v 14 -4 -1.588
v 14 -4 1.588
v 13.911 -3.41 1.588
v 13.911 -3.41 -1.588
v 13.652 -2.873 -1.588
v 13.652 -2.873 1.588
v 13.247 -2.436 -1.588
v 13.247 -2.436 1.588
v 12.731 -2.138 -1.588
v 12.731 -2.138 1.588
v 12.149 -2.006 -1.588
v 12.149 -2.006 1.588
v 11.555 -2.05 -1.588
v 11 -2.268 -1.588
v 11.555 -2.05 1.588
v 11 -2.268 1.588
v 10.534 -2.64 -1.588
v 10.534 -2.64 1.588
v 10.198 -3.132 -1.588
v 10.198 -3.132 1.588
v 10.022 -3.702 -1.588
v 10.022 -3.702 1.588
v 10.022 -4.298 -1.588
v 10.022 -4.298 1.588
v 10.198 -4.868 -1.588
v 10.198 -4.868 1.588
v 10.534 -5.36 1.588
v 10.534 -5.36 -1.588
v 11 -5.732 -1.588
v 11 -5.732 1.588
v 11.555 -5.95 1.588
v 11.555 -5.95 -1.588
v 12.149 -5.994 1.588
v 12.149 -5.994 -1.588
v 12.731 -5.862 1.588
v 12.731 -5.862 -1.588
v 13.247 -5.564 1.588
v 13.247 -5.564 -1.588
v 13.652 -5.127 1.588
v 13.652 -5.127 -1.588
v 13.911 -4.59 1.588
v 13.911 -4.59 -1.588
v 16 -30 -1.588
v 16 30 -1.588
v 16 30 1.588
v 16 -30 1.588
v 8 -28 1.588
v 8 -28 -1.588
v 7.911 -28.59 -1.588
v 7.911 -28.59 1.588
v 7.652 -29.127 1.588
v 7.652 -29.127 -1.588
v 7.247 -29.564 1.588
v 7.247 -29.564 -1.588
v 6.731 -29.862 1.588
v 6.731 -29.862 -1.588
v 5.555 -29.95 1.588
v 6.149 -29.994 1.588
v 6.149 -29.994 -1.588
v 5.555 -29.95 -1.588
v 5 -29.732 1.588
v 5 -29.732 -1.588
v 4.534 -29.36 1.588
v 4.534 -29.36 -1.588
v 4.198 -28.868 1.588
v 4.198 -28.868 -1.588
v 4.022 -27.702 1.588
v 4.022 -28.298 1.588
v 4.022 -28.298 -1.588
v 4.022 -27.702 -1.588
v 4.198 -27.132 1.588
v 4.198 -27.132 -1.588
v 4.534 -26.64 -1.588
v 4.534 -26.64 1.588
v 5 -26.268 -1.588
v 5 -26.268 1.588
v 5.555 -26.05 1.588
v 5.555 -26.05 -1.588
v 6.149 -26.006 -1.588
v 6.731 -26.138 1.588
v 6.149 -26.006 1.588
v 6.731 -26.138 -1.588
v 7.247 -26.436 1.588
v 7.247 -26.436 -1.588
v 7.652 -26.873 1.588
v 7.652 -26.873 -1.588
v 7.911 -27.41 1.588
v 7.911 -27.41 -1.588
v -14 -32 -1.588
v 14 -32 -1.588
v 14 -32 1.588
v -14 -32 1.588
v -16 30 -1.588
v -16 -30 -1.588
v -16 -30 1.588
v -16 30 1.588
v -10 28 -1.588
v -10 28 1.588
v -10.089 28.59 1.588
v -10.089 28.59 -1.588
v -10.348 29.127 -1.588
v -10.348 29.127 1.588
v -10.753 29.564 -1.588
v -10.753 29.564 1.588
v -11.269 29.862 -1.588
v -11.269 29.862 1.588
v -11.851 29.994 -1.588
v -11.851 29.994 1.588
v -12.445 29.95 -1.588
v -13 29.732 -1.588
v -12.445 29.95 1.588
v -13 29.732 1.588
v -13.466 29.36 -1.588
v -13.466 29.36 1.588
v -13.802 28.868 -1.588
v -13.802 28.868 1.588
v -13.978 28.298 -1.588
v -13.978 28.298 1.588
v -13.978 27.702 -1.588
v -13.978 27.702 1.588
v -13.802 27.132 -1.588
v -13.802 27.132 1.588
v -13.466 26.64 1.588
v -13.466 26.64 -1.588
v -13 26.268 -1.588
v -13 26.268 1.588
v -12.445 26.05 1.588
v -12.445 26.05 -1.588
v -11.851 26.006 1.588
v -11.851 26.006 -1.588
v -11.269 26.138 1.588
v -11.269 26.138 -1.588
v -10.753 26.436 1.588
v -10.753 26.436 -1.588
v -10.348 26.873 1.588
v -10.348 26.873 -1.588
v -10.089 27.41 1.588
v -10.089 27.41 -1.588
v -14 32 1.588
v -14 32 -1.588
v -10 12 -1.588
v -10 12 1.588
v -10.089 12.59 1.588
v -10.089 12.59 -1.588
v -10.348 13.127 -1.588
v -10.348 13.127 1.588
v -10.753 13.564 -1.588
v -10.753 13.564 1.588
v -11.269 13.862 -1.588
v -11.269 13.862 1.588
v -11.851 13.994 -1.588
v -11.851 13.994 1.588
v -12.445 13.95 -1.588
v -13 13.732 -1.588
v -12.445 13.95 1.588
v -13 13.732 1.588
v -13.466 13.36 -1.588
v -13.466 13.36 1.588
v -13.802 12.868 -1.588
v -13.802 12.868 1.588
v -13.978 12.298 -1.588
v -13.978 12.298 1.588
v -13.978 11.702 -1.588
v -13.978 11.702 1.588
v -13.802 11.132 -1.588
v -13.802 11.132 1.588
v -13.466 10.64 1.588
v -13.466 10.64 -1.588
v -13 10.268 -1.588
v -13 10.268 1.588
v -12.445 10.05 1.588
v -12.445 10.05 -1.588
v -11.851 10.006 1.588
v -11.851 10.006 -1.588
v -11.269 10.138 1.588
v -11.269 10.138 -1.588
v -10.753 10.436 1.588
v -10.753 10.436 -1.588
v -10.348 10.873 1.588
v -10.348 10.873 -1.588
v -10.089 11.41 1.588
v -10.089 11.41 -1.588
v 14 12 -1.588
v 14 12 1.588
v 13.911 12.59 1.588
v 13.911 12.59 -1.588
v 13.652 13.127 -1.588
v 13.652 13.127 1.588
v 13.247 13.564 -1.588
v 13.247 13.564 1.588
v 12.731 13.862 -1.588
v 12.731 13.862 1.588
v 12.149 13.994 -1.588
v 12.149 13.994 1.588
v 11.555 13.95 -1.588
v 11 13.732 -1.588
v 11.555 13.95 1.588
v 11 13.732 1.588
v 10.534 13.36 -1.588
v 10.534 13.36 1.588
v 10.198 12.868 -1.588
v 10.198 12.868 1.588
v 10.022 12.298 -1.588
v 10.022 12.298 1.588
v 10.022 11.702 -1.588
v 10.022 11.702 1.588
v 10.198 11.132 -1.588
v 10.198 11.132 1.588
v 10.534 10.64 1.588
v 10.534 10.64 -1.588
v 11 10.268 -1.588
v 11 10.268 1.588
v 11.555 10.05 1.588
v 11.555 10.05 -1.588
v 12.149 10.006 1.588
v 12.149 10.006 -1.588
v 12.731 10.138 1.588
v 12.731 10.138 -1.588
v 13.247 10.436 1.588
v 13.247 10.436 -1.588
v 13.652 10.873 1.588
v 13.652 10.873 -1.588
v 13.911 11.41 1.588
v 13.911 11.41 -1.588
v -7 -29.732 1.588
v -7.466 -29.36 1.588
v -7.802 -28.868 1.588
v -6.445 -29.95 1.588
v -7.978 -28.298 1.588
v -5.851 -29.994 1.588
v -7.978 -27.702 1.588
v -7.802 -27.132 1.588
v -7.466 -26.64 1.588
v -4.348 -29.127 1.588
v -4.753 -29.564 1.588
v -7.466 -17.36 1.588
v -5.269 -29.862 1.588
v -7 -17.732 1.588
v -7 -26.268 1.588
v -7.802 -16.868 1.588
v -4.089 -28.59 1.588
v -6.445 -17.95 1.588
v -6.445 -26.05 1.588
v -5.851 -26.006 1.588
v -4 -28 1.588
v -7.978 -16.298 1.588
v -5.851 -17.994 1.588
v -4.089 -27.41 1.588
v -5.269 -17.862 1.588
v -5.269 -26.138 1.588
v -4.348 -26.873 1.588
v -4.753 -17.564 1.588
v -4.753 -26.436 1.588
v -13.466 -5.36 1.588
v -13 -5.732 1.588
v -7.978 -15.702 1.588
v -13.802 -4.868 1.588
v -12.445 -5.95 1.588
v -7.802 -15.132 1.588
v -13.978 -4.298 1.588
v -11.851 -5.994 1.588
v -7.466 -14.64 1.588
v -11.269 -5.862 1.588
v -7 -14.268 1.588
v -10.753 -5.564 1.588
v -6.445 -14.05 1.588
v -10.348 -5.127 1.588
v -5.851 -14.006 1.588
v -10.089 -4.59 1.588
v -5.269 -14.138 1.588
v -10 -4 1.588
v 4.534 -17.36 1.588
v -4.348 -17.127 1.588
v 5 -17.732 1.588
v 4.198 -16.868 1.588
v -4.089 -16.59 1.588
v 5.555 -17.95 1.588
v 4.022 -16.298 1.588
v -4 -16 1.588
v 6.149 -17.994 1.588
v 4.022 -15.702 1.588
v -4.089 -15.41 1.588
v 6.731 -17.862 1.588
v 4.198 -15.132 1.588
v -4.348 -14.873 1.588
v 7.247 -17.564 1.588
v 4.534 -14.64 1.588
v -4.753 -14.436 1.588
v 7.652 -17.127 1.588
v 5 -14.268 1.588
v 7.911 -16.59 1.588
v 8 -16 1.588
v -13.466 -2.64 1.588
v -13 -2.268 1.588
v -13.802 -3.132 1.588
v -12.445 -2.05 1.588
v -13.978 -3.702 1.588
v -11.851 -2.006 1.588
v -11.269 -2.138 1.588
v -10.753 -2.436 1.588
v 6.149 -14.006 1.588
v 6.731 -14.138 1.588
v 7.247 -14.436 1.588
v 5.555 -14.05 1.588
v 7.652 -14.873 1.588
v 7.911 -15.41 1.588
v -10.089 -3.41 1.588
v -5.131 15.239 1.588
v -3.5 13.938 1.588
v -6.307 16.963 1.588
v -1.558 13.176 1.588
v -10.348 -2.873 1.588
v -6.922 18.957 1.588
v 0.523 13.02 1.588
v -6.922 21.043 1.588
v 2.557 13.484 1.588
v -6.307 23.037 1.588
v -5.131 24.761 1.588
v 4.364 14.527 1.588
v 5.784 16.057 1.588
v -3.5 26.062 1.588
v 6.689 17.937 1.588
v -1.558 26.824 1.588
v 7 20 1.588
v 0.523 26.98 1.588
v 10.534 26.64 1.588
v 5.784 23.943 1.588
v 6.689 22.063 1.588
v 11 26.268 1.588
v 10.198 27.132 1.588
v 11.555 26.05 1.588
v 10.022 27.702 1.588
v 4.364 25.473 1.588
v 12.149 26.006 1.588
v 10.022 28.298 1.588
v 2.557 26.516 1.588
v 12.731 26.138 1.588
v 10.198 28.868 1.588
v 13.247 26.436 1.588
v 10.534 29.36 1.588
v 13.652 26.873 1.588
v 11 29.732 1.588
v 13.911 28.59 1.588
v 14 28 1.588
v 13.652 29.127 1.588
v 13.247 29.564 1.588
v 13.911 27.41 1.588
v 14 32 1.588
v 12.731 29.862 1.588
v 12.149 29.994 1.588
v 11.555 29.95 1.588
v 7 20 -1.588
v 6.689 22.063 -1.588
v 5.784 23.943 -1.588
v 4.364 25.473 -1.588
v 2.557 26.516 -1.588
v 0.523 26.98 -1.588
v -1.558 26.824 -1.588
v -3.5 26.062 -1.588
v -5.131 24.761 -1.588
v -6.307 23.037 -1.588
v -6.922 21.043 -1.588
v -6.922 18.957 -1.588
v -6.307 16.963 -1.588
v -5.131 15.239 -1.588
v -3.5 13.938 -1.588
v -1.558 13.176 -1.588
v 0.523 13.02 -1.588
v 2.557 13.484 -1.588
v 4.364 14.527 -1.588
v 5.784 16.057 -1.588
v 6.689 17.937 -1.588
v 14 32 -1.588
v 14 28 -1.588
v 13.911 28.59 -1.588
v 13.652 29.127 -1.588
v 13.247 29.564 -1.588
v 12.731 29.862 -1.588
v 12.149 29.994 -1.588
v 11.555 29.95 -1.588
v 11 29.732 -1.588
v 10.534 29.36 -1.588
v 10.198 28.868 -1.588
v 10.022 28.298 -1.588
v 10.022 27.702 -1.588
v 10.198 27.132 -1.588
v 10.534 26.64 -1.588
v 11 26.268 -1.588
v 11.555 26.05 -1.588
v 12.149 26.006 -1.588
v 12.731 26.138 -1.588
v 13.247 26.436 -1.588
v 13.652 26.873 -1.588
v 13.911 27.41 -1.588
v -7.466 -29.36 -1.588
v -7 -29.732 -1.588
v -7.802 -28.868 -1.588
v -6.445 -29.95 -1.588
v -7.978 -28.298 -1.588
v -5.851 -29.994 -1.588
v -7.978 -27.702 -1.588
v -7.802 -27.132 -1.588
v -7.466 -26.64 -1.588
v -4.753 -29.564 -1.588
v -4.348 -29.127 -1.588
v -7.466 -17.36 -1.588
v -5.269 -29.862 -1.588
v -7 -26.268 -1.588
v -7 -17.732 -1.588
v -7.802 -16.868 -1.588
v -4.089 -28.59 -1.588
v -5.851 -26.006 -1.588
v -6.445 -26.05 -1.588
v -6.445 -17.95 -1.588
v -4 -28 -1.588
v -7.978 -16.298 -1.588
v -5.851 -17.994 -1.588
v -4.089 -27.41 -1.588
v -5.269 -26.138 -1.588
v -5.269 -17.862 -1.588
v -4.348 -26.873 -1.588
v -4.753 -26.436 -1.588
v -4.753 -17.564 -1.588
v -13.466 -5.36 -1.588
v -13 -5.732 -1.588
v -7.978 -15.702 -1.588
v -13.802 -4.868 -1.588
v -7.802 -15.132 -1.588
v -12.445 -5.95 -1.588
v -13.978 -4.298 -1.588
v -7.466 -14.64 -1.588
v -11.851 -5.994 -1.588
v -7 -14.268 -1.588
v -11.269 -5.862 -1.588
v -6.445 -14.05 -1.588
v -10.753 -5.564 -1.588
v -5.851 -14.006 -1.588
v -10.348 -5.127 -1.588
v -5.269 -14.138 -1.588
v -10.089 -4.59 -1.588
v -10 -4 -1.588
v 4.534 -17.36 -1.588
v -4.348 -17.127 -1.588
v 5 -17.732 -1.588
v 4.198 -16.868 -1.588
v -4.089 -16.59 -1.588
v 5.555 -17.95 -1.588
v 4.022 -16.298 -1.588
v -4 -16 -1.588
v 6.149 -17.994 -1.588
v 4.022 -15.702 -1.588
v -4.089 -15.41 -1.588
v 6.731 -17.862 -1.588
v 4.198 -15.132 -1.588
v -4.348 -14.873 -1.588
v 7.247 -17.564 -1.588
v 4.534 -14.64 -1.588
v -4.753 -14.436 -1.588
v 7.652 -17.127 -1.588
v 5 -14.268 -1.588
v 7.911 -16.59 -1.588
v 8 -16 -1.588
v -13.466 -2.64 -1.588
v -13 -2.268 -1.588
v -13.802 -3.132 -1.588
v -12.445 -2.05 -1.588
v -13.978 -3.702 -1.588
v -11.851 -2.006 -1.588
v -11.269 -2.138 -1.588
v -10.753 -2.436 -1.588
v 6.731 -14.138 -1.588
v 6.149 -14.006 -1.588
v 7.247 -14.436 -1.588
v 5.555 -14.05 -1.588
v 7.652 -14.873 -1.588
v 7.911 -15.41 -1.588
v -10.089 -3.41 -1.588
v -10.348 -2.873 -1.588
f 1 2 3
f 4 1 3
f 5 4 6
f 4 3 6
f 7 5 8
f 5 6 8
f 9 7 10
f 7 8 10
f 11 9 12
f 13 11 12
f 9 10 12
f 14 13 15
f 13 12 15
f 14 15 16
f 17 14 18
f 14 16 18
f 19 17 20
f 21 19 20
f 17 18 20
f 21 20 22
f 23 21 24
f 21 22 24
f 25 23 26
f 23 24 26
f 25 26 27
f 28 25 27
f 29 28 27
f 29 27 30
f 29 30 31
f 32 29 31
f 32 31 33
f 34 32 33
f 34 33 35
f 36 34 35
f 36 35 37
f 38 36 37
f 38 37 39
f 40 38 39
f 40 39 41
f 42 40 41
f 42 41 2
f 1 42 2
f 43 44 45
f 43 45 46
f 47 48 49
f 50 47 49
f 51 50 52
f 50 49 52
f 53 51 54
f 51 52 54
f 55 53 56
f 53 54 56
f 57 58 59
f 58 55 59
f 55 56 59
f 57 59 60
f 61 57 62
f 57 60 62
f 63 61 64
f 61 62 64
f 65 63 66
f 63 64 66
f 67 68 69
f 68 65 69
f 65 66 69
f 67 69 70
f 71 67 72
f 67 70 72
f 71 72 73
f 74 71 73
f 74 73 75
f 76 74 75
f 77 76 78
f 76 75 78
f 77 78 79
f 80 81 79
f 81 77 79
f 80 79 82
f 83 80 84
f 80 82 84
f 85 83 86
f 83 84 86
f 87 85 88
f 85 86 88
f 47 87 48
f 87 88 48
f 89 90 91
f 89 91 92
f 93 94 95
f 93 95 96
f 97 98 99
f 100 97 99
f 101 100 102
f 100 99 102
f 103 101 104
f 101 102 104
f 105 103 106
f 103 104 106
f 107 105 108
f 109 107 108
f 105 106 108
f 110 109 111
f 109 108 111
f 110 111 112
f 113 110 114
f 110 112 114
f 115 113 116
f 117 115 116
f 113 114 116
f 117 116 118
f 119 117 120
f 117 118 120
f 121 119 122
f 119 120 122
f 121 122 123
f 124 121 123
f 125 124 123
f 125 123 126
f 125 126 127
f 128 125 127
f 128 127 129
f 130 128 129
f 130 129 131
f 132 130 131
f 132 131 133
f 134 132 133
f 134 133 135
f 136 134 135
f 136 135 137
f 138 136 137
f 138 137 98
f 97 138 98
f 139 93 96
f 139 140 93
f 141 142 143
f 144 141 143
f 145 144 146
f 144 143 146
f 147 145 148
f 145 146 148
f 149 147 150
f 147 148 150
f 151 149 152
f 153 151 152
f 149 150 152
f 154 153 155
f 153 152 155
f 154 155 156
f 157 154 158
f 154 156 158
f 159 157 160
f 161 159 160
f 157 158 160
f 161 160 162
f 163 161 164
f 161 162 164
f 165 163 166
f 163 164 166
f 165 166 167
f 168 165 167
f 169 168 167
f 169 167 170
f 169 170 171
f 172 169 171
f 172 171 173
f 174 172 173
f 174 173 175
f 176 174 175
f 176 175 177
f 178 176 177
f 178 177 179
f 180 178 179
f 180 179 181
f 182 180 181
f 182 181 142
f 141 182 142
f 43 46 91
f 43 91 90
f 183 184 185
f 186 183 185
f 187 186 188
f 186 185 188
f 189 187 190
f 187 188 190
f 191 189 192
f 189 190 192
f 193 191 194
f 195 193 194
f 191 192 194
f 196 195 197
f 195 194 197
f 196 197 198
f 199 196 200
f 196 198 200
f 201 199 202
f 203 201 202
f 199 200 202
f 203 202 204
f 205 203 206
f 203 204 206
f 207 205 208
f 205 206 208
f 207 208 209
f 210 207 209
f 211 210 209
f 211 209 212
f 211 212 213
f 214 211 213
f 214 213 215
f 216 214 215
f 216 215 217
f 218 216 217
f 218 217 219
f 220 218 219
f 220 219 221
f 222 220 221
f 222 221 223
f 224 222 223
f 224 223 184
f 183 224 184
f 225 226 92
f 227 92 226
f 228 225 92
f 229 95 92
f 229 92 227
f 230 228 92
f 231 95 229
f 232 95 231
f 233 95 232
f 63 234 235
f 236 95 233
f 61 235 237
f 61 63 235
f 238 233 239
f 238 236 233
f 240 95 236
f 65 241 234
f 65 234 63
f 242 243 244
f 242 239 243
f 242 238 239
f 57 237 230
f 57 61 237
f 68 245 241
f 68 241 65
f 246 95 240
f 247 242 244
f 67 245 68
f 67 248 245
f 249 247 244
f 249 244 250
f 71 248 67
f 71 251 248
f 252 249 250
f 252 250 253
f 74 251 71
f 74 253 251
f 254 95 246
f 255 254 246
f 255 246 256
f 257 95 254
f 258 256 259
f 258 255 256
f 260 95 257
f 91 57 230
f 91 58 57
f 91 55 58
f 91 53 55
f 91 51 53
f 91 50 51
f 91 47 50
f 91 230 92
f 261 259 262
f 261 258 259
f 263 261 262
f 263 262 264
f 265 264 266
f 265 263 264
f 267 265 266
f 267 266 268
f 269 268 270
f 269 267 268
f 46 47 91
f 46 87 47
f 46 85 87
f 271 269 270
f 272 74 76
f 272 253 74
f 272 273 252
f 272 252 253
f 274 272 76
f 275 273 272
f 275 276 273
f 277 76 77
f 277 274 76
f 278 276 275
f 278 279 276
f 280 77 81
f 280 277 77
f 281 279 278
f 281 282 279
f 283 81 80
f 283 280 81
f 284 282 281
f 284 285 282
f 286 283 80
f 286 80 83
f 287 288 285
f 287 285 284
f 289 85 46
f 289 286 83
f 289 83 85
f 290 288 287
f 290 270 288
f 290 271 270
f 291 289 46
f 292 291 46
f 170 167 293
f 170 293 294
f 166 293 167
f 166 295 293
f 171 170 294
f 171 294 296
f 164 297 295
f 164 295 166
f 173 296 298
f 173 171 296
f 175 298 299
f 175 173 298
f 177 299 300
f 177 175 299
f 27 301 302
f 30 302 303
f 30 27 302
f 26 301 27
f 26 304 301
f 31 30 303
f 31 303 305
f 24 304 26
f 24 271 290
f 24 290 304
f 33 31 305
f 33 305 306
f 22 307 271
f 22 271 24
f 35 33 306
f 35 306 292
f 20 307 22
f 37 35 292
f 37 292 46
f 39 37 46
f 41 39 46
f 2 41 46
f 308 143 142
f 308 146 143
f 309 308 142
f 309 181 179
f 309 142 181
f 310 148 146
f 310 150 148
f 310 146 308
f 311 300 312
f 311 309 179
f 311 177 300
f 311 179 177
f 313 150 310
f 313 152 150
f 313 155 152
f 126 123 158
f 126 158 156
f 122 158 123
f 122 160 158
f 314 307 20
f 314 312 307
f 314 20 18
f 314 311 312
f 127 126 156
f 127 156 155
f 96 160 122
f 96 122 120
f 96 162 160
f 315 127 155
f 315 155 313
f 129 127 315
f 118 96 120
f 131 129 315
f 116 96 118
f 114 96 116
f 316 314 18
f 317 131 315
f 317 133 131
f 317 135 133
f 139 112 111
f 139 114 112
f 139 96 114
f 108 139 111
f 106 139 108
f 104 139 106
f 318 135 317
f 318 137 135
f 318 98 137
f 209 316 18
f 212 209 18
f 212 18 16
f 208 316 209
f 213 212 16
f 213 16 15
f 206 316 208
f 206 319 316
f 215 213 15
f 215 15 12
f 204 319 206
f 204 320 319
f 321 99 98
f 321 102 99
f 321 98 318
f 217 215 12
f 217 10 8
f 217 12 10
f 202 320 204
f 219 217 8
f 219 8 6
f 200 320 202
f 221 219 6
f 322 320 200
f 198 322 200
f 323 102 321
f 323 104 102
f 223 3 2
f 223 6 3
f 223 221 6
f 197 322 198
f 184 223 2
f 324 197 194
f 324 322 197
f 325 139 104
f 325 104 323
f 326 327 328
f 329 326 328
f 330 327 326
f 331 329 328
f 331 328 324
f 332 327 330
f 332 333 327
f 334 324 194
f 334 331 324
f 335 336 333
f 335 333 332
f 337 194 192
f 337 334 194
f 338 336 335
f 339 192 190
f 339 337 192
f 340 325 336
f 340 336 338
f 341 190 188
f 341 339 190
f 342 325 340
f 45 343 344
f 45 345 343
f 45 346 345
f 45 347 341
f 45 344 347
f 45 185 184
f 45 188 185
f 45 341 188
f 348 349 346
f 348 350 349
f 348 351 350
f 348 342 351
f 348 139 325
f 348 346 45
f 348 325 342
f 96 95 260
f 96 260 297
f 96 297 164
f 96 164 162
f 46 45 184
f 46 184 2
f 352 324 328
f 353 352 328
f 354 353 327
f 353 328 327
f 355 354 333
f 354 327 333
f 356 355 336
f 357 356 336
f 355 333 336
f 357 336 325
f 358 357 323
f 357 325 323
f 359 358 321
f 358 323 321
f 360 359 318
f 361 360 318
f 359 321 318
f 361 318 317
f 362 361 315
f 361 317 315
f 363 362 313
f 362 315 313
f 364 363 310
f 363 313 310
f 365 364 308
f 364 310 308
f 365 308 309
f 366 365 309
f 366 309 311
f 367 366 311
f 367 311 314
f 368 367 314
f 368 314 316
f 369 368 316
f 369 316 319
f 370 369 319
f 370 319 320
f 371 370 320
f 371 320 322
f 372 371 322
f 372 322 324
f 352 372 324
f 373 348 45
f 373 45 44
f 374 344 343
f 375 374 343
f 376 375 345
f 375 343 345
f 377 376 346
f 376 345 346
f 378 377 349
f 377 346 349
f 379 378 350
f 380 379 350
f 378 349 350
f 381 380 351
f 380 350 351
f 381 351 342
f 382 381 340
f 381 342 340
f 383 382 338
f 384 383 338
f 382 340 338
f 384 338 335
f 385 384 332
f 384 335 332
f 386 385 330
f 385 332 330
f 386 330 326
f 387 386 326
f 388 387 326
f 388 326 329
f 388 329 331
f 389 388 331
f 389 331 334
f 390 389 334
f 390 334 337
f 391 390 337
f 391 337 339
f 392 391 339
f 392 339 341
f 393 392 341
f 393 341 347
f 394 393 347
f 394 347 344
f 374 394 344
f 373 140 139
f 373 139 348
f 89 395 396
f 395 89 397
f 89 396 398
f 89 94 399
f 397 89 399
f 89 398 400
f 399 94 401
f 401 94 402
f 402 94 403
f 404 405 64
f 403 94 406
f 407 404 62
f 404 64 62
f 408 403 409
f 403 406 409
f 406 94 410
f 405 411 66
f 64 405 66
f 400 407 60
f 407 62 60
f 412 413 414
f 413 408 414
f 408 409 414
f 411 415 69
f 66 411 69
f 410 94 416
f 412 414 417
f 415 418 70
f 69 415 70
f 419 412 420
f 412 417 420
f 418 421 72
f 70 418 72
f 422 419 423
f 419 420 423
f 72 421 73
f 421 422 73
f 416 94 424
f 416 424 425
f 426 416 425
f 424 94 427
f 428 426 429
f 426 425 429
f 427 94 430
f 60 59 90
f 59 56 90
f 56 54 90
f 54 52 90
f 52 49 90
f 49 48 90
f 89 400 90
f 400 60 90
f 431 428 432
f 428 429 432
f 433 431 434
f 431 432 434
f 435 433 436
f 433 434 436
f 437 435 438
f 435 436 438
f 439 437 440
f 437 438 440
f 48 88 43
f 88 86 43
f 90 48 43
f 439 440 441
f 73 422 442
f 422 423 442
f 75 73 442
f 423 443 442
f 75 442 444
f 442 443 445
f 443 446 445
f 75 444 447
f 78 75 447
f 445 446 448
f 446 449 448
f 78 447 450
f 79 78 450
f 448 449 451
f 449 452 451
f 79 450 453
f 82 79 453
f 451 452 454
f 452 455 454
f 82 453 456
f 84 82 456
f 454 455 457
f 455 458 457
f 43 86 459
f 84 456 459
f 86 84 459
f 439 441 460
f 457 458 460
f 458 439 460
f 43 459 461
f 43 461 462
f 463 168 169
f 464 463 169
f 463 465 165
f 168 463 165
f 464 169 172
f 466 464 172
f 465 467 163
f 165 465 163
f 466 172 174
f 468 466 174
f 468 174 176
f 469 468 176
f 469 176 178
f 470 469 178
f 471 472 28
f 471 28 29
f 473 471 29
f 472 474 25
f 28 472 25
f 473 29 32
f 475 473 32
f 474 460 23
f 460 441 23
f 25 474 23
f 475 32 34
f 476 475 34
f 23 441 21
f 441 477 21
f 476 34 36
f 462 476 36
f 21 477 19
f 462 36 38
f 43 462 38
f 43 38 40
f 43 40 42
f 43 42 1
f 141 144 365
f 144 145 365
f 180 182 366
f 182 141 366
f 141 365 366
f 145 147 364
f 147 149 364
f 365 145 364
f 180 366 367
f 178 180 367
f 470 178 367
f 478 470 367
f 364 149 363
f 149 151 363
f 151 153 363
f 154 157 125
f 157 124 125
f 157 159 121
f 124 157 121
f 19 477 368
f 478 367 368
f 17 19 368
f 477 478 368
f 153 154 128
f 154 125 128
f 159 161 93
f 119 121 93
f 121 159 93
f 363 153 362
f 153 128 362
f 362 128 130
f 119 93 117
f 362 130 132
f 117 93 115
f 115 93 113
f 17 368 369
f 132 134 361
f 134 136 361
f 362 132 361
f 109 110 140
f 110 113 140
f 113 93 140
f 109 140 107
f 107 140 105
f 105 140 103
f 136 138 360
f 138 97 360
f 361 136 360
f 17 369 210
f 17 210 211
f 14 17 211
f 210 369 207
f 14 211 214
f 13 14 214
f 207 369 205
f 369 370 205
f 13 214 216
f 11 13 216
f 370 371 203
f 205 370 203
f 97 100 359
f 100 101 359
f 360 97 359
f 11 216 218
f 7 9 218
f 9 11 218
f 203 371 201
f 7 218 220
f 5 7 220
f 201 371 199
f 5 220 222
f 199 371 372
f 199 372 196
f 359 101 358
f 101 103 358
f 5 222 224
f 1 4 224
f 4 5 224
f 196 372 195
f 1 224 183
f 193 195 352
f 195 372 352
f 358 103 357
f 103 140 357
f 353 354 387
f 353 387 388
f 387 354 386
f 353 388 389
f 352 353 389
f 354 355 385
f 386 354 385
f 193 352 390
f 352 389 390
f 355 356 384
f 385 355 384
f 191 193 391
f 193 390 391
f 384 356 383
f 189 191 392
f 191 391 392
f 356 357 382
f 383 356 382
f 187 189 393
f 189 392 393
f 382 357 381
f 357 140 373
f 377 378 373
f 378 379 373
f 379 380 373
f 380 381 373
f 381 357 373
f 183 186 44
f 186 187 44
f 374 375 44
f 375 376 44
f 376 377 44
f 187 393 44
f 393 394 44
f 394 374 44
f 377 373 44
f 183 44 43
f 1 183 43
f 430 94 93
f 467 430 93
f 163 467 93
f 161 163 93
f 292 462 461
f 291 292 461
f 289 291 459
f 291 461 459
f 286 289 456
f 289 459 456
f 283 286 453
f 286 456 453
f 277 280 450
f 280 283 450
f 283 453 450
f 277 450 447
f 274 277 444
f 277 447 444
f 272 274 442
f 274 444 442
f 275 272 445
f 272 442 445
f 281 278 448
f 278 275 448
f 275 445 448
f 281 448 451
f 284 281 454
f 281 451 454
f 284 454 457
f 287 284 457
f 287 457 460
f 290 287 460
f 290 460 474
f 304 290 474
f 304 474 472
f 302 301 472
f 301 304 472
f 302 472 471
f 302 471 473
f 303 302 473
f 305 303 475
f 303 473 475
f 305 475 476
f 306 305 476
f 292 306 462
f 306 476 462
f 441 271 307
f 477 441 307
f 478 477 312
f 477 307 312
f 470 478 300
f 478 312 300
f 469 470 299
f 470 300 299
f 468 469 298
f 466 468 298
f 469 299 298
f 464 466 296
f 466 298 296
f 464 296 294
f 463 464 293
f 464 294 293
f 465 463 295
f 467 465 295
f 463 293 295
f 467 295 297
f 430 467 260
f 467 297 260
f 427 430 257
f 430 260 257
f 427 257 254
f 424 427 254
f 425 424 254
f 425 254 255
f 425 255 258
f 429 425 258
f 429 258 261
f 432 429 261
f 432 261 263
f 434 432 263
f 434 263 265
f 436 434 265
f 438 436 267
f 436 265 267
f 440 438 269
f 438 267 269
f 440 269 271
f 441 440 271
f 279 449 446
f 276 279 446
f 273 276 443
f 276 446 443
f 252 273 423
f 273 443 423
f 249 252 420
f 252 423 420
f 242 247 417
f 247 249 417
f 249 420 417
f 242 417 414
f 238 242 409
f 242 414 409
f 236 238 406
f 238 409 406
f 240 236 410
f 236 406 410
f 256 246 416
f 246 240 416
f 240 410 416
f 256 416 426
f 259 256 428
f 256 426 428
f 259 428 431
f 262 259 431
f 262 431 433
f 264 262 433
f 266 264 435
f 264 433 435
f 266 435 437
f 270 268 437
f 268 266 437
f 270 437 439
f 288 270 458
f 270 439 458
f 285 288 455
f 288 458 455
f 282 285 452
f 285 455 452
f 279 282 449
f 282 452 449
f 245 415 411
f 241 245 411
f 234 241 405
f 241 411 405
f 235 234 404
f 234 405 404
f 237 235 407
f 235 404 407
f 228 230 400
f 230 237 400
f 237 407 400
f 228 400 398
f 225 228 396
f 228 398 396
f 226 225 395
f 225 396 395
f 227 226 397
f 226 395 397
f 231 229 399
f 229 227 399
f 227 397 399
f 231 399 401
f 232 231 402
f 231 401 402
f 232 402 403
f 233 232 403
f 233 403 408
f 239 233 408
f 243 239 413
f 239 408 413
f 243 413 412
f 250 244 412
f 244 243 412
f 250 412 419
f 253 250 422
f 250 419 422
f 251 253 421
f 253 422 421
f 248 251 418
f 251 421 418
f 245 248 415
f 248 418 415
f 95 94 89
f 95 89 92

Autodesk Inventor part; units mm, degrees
ref_plane "YZ Plane" through (0, 0, 0) normal (1, 0, 0) x (0, 1, 0)
ref_plane "XZ Plane" through (0, 0, 0) normal (0, 1, 0) x (-1, 0, 0)
ref_plane "XY Plane" through (0, 0, 0) normal (0, 0, 1) x (1, 0, 0)
sketch "Sketch1" plane through (0, 0, 0) normal (0, 0, 1) x (1, 0, 0)
  line L0 (16, -32) -> (-16, -32)
  line L1 (-16, -32) -> (-16, 32)
  line L2 (-16, 32) -> (16, 32)
  line L3 (16, 32) -> (16, -32)
  line L4 (16, -32) -> (-16, 32) construction
  line L5 (-16, -32) -> (16, 32) construction
  circle A0 centre (0, -22) radius 2.5 construction
  circle A1 centre (-6, -28) radius 2
  circle A2 centre (6, -28) radius 2
  circle A3 centre (6, -16) radius 2
  circle A4 centre (-6, -16) radius 2
  line L6 (-16, 0) -> (16, 0) construction
  point P0 (0, 0)
  point P1 (0, -32)
  dimension "d0" = 32
  dimension "d1" = 64
  dimension "d2" = 5
  dimension "d3" = 10
  dimension "d4" = 4
  dimension "d5" = 6
  dimension "d6" = 6
  dimension "d9" = 360
extrude "Extrusion1" add sketch "Sketch1" along normal mid plane 3.175
sketch "Sketch2" plane through (0, 0, 1.5875) normal (0, 0, 1) x (1, 0, 0)
  line L0 (16, 32) -> (-16, 32) construction
  line L1 (-16, 32) -> (-16, -32) construction
  line L2 (-16, -32) -> (16, -32) construction
  line L3 (16, -32) -> (16, 32) construction
  circle A0 centre (-6, -16) radius 2 construction
  circle A1 centre (6, -16) radius 2 construction
  circle A2 centre (6, -28) radius 2 construction
  circle A3 centre (-6, -28) radius 2 construction
  circle A4 centre (0, 20) radius 7
  circle A5 centre (-12, 28) radius 2
  line L4 (0, 32) -> (0, -32) construction
  line L5 (-16, 32) -> (-16, -32) projected
  line L6 (-16, 0) -> (16, 0) construction
  circle A6 centre (-12, 12) radius 2
  circle A7 centre (-12, -4) radius 2
  circle A8 centre (12, 28) radius 2
  circle A9 centre (12, 12) radius 2
  circle A10 centre (12, -4) radius 2
  point P0 (0, 0)
  dimension "d14" = 14
  dimension "d15" = 20
  dimension "d16" = 4
  dimension "d17" = 4
  dimension "d18" = 4
  dimension "d19" = 4
  dimension "d20" = 16
  dimension "d21" = 4
  dimension "d22" = 16
extrude "Extrusion2" cut sketch "Sketch2" against normal through all
chamfer "Chamfer1" distance 2 angle 45 4 edges at (16, 32, 0) (-16, 32, 0) (16, -32, 0) (-16, -32, 0)
properties part number "ArmSidePlate"
